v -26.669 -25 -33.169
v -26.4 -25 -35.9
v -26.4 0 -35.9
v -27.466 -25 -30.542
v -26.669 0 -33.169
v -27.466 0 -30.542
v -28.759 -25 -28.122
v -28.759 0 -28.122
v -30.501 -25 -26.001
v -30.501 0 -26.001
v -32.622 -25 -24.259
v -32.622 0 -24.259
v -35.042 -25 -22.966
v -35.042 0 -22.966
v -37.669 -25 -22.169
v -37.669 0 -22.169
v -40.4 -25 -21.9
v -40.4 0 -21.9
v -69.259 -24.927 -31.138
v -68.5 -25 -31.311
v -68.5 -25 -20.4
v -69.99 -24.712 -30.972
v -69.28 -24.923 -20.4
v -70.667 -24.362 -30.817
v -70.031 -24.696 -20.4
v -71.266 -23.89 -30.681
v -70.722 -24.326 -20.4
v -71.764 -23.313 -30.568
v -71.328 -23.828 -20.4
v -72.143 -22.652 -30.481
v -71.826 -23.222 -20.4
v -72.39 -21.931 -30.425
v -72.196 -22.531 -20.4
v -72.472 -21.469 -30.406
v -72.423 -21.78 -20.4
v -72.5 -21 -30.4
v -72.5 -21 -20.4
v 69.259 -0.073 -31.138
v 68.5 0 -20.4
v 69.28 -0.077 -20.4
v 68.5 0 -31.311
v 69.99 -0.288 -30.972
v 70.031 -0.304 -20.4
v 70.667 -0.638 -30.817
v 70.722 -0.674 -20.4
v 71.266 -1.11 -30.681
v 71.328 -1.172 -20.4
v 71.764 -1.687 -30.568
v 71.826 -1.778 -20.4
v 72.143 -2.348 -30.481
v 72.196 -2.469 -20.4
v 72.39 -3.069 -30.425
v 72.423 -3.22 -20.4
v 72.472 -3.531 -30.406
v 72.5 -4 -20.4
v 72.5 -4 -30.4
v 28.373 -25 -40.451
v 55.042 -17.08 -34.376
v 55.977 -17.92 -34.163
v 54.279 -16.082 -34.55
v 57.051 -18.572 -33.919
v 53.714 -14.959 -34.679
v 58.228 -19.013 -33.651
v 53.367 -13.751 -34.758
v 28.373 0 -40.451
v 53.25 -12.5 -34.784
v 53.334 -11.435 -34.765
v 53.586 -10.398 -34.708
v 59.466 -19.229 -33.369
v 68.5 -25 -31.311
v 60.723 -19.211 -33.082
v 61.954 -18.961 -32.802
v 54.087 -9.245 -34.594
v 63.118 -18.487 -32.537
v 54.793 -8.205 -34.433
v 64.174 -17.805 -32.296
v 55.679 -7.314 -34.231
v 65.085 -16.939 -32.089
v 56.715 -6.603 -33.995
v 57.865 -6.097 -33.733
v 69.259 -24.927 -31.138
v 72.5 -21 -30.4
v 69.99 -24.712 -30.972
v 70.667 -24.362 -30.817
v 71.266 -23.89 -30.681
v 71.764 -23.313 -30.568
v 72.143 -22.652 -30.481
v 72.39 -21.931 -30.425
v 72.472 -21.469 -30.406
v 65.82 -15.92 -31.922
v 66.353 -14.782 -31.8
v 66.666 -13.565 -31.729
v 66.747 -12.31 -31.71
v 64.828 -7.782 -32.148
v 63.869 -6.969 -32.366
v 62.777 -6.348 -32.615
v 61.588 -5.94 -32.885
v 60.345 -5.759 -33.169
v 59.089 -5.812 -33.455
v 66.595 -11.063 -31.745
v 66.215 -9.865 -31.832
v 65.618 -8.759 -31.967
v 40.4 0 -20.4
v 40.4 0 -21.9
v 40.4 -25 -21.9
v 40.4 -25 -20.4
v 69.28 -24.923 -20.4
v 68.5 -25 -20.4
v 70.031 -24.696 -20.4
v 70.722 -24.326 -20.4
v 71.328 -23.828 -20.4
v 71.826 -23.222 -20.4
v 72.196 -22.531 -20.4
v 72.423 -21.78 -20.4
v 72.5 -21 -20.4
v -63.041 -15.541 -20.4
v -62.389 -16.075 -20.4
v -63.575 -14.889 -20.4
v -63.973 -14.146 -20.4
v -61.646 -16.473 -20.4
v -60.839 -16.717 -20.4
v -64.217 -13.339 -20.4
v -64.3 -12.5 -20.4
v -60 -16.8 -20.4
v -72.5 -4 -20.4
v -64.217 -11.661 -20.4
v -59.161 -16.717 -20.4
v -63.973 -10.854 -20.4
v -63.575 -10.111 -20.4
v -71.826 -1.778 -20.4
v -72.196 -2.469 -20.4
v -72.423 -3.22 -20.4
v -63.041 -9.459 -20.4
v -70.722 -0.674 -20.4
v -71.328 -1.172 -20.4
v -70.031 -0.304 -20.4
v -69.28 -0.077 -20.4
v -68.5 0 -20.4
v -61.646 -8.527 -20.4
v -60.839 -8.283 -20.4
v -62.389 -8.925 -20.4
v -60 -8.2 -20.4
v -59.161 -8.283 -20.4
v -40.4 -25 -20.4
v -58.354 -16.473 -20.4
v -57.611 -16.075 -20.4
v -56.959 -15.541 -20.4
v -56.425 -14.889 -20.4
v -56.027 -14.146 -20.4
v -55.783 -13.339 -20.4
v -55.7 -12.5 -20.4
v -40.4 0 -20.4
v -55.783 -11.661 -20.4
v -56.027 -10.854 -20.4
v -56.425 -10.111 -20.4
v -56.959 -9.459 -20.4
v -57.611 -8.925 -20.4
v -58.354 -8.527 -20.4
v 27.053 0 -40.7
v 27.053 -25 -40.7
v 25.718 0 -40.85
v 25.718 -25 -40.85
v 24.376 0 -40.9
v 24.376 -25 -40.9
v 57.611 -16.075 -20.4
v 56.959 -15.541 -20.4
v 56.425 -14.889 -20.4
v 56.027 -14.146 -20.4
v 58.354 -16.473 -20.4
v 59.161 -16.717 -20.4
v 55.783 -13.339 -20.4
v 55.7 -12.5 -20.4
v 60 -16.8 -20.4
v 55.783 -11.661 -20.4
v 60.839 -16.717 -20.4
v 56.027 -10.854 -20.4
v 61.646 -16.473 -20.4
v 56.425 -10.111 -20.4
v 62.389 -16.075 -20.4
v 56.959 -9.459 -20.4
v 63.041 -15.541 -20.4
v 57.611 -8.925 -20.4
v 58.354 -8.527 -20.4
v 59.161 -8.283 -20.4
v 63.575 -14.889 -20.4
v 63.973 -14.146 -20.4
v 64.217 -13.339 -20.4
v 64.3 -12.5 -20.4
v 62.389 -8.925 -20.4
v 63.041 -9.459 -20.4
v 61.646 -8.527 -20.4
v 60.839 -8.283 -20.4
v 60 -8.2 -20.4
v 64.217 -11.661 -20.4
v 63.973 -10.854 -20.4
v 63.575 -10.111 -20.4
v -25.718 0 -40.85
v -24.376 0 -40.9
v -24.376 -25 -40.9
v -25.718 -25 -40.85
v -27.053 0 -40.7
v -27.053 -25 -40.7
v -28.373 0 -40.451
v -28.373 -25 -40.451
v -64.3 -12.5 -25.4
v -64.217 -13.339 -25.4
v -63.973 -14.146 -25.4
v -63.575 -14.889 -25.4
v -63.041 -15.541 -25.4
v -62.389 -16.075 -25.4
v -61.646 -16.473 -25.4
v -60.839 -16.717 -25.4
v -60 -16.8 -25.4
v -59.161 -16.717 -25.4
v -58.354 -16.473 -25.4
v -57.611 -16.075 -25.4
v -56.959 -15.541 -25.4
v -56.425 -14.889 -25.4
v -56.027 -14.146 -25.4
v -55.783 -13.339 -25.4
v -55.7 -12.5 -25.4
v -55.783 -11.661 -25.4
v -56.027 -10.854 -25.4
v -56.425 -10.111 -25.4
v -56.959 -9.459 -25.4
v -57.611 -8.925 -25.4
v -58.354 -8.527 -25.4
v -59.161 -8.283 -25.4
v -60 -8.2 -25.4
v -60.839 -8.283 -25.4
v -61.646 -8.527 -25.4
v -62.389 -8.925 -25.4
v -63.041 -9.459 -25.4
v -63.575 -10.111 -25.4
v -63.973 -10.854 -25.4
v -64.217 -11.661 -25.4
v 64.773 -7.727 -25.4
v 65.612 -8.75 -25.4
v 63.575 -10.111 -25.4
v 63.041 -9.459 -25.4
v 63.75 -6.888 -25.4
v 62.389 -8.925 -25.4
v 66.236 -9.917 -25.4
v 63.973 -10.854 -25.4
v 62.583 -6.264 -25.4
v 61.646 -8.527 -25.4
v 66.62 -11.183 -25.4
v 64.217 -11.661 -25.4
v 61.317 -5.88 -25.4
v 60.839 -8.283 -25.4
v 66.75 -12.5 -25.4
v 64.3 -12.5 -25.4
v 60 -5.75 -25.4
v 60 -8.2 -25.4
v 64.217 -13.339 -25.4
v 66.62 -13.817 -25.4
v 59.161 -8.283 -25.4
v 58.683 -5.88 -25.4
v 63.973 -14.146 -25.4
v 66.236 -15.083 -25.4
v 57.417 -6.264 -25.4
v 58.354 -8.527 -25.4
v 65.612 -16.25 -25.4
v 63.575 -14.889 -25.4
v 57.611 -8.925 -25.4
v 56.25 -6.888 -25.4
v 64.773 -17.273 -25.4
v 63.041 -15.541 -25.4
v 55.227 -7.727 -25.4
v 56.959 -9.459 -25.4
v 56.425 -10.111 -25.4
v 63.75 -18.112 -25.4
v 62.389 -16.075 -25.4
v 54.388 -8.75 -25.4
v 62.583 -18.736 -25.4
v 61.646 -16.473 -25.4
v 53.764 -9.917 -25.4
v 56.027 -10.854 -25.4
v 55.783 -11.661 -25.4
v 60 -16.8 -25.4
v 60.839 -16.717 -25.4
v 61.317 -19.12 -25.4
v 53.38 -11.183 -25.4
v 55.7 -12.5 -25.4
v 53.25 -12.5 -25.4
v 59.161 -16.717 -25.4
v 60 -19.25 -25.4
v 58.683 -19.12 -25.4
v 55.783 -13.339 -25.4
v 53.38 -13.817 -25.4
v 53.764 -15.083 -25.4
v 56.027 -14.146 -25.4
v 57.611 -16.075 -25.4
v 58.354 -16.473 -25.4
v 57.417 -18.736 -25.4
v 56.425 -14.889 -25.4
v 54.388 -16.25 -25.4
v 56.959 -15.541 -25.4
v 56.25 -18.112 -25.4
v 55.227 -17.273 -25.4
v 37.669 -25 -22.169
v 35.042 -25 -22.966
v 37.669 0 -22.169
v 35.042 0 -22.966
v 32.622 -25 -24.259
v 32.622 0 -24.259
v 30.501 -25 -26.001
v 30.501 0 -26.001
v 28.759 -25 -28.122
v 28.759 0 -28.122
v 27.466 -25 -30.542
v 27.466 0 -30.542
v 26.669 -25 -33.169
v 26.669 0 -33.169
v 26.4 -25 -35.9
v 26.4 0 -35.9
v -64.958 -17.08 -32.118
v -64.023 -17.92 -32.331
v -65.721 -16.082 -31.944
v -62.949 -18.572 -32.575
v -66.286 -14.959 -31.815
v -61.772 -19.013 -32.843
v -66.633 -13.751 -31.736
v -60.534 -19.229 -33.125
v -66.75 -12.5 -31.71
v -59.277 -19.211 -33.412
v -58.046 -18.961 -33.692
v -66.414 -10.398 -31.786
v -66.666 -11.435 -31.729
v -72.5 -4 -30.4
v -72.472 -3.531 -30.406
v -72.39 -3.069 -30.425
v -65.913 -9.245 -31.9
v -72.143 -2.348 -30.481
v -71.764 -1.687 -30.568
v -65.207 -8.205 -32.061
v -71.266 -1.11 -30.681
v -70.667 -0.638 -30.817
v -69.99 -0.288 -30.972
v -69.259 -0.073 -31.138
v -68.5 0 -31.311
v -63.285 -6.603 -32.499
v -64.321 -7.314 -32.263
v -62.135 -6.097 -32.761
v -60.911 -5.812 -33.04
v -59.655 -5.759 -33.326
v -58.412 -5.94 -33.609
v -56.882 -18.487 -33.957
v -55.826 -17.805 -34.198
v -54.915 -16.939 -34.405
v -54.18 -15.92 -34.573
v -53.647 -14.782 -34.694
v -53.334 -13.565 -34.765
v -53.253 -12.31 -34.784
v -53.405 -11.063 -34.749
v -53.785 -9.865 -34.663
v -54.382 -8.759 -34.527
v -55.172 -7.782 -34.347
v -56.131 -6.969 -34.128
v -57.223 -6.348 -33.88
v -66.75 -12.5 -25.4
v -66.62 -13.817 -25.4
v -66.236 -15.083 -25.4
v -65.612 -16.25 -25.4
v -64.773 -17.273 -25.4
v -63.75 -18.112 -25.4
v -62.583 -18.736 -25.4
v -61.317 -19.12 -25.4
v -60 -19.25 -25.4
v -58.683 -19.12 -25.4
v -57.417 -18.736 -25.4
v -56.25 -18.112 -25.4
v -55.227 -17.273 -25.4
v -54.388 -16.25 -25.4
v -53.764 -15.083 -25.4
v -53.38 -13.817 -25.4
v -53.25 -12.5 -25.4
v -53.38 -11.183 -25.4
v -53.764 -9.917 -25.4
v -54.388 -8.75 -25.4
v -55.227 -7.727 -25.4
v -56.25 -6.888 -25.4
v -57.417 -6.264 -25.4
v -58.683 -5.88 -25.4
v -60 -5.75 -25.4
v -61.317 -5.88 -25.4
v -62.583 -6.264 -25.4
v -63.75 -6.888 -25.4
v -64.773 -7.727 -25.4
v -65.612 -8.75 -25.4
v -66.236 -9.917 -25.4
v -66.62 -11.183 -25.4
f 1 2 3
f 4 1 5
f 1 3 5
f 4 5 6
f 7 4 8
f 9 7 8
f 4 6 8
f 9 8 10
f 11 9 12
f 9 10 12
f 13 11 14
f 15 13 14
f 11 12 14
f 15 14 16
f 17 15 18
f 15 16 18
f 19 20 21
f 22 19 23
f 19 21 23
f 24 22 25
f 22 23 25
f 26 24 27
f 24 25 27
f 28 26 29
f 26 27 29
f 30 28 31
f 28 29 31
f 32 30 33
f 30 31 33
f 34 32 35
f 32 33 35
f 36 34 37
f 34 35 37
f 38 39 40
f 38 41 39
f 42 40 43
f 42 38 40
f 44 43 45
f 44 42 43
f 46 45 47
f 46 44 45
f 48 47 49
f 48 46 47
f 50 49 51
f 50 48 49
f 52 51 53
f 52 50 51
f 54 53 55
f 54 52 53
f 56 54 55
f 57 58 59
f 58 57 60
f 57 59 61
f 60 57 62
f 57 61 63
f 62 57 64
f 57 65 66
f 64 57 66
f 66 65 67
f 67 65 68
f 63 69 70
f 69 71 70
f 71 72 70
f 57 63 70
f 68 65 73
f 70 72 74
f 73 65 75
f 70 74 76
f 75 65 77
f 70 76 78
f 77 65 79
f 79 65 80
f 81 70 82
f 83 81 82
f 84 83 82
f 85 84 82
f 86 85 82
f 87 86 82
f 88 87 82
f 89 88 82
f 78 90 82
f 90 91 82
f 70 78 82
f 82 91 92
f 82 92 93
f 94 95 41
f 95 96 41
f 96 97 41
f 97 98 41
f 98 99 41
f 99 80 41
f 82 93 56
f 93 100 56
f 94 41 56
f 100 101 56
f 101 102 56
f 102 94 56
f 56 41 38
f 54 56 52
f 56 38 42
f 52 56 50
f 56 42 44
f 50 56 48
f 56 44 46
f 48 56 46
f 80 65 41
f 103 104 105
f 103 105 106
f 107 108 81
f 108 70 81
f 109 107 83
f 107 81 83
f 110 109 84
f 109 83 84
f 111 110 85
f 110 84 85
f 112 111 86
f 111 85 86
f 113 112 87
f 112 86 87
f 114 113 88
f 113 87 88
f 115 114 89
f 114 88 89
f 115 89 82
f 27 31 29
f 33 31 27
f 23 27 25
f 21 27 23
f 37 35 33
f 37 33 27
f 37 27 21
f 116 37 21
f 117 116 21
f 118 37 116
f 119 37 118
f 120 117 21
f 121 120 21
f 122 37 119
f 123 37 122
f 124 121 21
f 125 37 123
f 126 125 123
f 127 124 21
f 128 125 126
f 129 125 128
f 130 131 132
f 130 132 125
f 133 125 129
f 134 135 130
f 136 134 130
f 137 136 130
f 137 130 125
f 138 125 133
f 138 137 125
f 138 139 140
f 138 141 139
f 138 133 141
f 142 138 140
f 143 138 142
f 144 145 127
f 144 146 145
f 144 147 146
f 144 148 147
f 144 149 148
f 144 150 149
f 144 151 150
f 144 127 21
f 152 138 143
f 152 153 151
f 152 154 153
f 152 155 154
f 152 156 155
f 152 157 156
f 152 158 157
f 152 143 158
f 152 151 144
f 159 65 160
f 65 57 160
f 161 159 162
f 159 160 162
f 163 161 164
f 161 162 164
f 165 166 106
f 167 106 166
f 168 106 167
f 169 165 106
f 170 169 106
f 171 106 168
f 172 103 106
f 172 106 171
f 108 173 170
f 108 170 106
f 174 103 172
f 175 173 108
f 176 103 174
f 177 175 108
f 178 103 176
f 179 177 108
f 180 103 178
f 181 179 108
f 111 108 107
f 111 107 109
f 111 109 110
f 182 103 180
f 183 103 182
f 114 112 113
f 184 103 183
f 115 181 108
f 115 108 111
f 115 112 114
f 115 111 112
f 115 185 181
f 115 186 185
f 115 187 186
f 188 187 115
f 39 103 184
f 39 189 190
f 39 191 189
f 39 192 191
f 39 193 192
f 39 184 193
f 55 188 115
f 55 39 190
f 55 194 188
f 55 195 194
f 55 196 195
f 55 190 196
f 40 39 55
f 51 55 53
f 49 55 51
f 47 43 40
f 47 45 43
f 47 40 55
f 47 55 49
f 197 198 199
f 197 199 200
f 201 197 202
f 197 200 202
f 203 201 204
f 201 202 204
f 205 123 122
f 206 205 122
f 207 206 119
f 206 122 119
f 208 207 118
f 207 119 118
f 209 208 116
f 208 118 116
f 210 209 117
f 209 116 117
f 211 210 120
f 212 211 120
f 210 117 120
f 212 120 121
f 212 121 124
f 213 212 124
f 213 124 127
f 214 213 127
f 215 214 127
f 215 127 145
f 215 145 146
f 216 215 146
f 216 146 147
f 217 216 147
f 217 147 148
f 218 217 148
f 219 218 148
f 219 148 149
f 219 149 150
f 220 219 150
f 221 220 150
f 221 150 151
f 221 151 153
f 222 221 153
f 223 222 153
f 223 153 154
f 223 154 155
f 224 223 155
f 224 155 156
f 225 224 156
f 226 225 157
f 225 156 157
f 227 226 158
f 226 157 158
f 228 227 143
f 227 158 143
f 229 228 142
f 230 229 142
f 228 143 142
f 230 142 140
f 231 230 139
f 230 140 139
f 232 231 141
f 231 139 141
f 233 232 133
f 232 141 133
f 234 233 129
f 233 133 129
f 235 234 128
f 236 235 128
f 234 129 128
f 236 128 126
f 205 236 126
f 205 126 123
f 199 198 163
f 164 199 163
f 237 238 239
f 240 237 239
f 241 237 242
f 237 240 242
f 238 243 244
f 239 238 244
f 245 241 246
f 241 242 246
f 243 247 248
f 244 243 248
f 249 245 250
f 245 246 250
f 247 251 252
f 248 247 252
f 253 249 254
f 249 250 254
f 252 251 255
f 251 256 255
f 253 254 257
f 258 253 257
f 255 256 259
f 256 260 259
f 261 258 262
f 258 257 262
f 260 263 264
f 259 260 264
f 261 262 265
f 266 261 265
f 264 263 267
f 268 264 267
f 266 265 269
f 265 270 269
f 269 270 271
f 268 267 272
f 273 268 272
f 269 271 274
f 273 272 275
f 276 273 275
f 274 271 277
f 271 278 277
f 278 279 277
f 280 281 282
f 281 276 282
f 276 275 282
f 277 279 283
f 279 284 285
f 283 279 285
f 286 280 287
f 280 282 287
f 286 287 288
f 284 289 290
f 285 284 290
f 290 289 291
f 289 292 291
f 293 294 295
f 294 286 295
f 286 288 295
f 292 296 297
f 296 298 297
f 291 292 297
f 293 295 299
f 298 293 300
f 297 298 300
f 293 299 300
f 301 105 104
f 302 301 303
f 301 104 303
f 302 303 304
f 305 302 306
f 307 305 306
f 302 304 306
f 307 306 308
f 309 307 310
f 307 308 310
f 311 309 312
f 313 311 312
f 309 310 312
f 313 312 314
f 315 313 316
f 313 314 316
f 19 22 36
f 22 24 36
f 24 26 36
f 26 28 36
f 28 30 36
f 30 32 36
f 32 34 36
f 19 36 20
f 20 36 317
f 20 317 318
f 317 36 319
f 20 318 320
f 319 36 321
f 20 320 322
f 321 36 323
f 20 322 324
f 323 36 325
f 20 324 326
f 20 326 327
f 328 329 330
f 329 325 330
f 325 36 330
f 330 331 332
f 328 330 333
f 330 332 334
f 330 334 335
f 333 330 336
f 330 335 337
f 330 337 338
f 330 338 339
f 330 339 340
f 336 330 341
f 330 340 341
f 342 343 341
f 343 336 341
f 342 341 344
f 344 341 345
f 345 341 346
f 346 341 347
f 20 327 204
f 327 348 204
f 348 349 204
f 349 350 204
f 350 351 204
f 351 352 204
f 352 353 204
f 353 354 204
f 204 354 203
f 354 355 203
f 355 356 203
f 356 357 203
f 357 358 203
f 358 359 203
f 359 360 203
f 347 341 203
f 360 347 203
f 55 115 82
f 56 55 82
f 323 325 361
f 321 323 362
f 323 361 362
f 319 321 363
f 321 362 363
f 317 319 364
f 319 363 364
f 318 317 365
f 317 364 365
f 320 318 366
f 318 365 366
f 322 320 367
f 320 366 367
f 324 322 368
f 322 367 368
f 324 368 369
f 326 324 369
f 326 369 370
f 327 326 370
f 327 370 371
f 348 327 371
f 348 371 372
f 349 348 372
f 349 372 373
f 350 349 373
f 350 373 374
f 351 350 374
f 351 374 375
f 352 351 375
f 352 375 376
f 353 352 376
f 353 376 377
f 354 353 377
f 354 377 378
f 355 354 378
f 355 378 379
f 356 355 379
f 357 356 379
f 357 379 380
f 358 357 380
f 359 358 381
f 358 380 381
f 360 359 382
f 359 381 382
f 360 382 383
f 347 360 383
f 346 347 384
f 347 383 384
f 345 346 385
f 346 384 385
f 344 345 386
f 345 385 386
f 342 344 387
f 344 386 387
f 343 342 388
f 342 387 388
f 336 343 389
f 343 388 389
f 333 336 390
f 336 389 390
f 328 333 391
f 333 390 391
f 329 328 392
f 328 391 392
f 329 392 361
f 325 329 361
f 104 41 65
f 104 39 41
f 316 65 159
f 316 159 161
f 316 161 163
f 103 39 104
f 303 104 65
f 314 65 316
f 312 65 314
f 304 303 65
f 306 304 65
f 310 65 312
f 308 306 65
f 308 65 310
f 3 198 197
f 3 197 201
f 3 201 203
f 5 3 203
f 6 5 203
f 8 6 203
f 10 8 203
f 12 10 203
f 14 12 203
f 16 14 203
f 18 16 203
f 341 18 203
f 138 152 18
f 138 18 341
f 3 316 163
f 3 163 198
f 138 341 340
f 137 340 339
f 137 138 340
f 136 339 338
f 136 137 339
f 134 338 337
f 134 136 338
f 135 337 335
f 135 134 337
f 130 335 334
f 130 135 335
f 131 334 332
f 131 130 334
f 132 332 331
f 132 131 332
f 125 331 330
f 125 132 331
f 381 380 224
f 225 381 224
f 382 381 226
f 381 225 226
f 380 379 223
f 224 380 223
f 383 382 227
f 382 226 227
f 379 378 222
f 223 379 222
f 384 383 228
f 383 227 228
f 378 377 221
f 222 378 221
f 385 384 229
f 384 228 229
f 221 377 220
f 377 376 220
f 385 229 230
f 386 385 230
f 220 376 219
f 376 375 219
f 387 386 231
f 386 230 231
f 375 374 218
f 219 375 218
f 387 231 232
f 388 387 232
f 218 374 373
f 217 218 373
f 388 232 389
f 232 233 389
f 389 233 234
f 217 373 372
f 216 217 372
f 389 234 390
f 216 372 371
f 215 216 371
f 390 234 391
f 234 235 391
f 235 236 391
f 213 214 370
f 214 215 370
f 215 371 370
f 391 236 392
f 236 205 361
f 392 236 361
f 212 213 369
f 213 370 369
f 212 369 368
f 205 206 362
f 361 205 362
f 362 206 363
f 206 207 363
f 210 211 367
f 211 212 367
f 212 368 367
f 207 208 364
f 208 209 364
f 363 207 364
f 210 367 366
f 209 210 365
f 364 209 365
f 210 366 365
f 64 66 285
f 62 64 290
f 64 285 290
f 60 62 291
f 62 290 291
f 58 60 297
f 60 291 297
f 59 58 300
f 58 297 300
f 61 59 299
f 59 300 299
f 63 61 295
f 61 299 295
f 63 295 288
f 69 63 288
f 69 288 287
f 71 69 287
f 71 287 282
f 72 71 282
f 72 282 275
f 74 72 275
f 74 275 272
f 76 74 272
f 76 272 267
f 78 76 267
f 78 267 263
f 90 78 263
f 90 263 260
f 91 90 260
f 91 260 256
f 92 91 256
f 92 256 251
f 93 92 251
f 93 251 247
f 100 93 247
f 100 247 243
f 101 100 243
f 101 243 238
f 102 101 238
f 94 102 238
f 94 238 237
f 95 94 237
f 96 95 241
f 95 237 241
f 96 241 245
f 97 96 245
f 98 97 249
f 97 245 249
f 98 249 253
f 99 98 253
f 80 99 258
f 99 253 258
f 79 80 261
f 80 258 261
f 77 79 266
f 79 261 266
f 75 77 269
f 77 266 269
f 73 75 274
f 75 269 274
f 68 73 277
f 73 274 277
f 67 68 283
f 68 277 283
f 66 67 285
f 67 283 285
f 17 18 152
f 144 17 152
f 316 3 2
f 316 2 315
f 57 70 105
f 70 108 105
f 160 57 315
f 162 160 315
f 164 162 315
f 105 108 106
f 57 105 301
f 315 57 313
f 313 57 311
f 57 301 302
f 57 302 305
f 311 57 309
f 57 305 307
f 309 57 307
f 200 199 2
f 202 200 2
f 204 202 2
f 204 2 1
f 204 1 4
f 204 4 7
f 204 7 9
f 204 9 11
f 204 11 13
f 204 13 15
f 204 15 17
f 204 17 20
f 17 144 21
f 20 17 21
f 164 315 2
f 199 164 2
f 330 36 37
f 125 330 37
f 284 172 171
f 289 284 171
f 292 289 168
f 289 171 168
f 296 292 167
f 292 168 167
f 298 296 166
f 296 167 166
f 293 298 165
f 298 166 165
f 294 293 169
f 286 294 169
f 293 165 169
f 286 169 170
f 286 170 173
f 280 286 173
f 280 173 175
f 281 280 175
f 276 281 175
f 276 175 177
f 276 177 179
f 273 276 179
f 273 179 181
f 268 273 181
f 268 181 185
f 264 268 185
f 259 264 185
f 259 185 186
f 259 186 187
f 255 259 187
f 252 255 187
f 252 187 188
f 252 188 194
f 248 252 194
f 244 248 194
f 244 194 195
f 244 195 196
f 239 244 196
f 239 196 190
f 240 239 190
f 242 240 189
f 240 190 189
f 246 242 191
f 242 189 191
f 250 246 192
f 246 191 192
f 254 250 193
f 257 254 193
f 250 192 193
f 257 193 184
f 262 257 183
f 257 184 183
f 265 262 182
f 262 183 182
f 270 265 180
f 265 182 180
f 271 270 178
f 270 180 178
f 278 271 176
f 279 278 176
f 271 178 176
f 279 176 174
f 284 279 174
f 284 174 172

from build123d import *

# Parameters (mm, degrees)
PAD_DEPTH       = 25
SKETCH001_R     = 4.3
POCKET_DEPTH    = 20.501
SKETCH002_R     = 6.75
POCKET001_DEPTH = 15.501
FILLET_R        = 4
FILLET001_R     = 18


with BuildPart() as part:
    # Sketch → Pad (new body)
    with BuildSketch(Plane.XZ):
        with BuildLine():
            Line((40.4, -20.4), (72.5, -20.4))
            Line((72.5, -20.4), (72.5, -30.4))
            Line((26.4, -40.9), (72.5, -30.4))
            Line((-26.4, -40.9), (26.4, -40.9))
            Line((-72.5, -30.4), (-26.4, -40.9))
            Line((-72.5, -30.4), (-72.5, -20.4))
            Line((-72.5, -20.4), (-40.4, -20.4))
            Line((-40.4, -21.9), (-40.4, -20.4))
            ThreePointArc((-26.4, -35.9), (-30.500505, -26.000505), (-40.4, -21.9))
            Line((-26.4, -35.9), (26.4, -35.9))
            ThreePointArc((40.4, -21.9), (30.500505, -26.000505), (26.4, -35.9))
            Line((40.4, -21.9), (40.4, -20.4))
        make_face()
    extrude(amount=PAD_DEPTH)

    # Sketch001 (on Face8 of Pad) → Pocket (cut, through all)
    with BuildSketch(Plane(origin=(0, 0, -20.4), x_dir=(-1, 0, 0), z_dir=(0, 0, 1))):
        with Locations((-60, 12.5)):
            Circle(SKETCH001_R)
        with Locations((60, 12.5)):
            Circle(SKETCH001_R)
    extrude(amount=-POCKET_DEPTH, mode=Mode.SUBTRACT)

    # Sketch002 (on Face13 of Pocket) → Pocket001 (cut, through all)
    with BuildSketch(Plane(origin=(0, 0, -25.4), x_dir=(-1, 0, 0), z_dir=(0, 0, 1))):
        with Locations((-60, 12.5)):
            Circle(SKETCH002_R)
        with Locations((60, 12.5)):
            Circle(SKETCH002_R)
    extrude(amount=-POCKET001_DEPTH, mode=Mode.SUBTRACT)

    # Fillet
    fillet_edges = [part.edges().sort_by_distance(p)[0] for p in [
        (-72.5, -25, -25.4),
        (-72.5, 0, -25.4),
        (72.5, -25, -25.4),
        (72.5, 0, -25.4),
    ]]
    fillet(fillet_edges, radius=FILLET_R)

    # Fillet001
    fillet001_edges = [part.edges().sort_by_distance(p)[0] for p in [
        (-26.4, -12.5, -40.9),
        (26.4, -12.5, -40.9),
    ]]
    fillet(fillet001_edges, radius=FILLET001_R)


solid = part.part
